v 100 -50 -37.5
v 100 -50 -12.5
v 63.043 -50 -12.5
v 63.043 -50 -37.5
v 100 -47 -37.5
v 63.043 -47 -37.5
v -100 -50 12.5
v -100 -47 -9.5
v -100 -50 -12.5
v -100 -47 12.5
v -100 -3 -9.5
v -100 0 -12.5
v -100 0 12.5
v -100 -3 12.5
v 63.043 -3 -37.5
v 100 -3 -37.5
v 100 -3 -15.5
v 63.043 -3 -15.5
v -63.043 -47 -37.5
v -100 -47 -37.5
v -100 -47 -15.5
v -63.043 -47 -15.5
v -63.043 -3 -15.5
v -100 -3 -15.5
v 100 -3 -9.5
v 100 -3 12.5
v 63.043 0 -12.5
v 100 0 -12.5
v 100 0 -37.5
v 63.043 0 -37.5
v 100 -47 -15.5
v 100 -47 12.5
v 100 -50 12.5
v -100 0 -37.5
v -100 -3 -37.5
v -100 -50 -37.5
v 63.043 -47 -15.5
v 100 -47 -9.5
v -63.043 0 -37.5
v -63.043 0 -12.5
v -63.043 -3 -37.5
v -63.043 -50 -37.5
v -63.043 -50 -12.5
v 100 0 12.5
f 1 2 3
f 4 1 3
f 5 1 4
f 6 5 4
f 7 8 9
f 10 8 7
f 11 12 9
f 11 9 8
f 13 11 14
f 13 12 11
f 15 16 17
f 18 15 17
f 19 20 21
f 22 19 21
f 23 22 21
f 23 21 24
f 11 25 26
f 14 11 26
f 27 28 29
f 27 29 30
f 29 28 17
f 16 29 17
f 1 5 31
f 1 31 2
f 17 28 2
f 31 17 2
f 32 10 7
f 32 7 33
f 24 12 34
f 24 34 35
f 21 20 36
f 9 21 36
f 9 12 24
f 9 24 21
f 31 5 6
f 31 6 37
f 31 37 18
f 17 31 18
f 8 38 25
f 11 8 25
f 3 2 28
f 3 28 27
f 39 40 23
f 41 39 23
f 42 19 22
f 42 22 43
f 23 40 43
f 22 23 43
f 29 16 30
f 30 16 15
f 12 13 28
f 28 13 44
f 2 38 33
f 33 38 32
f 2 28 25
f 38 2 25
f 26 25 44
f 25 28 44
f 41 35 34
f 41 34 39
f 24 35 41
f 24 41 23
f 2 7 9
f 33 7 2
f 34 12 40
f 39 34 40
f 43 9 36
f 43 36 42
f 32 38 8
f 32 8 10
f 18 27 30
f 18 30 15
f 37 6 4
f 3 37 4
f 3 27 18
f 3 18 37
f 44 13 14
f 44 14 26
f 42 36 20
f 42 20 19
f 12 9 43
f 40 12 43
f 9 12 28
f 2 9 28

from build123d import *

# Parameters (mm, degrees)
F0_W     = 200
F0_H     = 25
F1_DEPTH = 50
F2_W     = 44
F2_H     = 22
F3_DEPTH = 200.001
F4_W     = 36.956964
F4_H     = 50
F5_DEPTH = 25
F6_W     = 44
F6_H     = 22
F7_DEPTH = 36.957964


with BuildPart() as f1:
    # F0 (on Front) → F1 (new body)
    with BuildSketch(Plane.XZ):
        Rectangle(F0_W, F0_H)
    extrude(amount=F1_DEPTH)

    # F2 (on face) → F3 (cut, through all)
    with BuildSketch(Plane.YZ.offset(100)):
        with Locations((-25, 1.5)):
            Rectangle(F2_W, F2_H)
    extrude(amount=-F3_DEPTH, mode=Mode.SUBTRACT)


with BuildPart() as f5:
    # F4 (on face) → F5 (new body)
    with BuildSketch(Plane(origin=(0, 0, -12.5), x_dir=(1, 0, 0), z_dir=(0, 0, -1))):
        with Locations((-81.521518, 25)):
            Rectangle(F4_W, F4_H)
    extrude(amount=F5_DEPTH)

    # F6 (on face) → F7 (cut, through all)
    with BuildSketch(Plane.YZ.offset(-63.043036)):
        with Locations((-25, -26.5)):
            Rectangle(F6_W, F6_H)
    extrude(amount=-F7_DEPTH, mode=Mode.SUBTRACT)


with BuildPart() as f8_1:
    # F8: instance of F5
    add(f5.part.mirror(Plane.YZ))


solid = Compound([f1.part, f5.part, f8_1.part])
